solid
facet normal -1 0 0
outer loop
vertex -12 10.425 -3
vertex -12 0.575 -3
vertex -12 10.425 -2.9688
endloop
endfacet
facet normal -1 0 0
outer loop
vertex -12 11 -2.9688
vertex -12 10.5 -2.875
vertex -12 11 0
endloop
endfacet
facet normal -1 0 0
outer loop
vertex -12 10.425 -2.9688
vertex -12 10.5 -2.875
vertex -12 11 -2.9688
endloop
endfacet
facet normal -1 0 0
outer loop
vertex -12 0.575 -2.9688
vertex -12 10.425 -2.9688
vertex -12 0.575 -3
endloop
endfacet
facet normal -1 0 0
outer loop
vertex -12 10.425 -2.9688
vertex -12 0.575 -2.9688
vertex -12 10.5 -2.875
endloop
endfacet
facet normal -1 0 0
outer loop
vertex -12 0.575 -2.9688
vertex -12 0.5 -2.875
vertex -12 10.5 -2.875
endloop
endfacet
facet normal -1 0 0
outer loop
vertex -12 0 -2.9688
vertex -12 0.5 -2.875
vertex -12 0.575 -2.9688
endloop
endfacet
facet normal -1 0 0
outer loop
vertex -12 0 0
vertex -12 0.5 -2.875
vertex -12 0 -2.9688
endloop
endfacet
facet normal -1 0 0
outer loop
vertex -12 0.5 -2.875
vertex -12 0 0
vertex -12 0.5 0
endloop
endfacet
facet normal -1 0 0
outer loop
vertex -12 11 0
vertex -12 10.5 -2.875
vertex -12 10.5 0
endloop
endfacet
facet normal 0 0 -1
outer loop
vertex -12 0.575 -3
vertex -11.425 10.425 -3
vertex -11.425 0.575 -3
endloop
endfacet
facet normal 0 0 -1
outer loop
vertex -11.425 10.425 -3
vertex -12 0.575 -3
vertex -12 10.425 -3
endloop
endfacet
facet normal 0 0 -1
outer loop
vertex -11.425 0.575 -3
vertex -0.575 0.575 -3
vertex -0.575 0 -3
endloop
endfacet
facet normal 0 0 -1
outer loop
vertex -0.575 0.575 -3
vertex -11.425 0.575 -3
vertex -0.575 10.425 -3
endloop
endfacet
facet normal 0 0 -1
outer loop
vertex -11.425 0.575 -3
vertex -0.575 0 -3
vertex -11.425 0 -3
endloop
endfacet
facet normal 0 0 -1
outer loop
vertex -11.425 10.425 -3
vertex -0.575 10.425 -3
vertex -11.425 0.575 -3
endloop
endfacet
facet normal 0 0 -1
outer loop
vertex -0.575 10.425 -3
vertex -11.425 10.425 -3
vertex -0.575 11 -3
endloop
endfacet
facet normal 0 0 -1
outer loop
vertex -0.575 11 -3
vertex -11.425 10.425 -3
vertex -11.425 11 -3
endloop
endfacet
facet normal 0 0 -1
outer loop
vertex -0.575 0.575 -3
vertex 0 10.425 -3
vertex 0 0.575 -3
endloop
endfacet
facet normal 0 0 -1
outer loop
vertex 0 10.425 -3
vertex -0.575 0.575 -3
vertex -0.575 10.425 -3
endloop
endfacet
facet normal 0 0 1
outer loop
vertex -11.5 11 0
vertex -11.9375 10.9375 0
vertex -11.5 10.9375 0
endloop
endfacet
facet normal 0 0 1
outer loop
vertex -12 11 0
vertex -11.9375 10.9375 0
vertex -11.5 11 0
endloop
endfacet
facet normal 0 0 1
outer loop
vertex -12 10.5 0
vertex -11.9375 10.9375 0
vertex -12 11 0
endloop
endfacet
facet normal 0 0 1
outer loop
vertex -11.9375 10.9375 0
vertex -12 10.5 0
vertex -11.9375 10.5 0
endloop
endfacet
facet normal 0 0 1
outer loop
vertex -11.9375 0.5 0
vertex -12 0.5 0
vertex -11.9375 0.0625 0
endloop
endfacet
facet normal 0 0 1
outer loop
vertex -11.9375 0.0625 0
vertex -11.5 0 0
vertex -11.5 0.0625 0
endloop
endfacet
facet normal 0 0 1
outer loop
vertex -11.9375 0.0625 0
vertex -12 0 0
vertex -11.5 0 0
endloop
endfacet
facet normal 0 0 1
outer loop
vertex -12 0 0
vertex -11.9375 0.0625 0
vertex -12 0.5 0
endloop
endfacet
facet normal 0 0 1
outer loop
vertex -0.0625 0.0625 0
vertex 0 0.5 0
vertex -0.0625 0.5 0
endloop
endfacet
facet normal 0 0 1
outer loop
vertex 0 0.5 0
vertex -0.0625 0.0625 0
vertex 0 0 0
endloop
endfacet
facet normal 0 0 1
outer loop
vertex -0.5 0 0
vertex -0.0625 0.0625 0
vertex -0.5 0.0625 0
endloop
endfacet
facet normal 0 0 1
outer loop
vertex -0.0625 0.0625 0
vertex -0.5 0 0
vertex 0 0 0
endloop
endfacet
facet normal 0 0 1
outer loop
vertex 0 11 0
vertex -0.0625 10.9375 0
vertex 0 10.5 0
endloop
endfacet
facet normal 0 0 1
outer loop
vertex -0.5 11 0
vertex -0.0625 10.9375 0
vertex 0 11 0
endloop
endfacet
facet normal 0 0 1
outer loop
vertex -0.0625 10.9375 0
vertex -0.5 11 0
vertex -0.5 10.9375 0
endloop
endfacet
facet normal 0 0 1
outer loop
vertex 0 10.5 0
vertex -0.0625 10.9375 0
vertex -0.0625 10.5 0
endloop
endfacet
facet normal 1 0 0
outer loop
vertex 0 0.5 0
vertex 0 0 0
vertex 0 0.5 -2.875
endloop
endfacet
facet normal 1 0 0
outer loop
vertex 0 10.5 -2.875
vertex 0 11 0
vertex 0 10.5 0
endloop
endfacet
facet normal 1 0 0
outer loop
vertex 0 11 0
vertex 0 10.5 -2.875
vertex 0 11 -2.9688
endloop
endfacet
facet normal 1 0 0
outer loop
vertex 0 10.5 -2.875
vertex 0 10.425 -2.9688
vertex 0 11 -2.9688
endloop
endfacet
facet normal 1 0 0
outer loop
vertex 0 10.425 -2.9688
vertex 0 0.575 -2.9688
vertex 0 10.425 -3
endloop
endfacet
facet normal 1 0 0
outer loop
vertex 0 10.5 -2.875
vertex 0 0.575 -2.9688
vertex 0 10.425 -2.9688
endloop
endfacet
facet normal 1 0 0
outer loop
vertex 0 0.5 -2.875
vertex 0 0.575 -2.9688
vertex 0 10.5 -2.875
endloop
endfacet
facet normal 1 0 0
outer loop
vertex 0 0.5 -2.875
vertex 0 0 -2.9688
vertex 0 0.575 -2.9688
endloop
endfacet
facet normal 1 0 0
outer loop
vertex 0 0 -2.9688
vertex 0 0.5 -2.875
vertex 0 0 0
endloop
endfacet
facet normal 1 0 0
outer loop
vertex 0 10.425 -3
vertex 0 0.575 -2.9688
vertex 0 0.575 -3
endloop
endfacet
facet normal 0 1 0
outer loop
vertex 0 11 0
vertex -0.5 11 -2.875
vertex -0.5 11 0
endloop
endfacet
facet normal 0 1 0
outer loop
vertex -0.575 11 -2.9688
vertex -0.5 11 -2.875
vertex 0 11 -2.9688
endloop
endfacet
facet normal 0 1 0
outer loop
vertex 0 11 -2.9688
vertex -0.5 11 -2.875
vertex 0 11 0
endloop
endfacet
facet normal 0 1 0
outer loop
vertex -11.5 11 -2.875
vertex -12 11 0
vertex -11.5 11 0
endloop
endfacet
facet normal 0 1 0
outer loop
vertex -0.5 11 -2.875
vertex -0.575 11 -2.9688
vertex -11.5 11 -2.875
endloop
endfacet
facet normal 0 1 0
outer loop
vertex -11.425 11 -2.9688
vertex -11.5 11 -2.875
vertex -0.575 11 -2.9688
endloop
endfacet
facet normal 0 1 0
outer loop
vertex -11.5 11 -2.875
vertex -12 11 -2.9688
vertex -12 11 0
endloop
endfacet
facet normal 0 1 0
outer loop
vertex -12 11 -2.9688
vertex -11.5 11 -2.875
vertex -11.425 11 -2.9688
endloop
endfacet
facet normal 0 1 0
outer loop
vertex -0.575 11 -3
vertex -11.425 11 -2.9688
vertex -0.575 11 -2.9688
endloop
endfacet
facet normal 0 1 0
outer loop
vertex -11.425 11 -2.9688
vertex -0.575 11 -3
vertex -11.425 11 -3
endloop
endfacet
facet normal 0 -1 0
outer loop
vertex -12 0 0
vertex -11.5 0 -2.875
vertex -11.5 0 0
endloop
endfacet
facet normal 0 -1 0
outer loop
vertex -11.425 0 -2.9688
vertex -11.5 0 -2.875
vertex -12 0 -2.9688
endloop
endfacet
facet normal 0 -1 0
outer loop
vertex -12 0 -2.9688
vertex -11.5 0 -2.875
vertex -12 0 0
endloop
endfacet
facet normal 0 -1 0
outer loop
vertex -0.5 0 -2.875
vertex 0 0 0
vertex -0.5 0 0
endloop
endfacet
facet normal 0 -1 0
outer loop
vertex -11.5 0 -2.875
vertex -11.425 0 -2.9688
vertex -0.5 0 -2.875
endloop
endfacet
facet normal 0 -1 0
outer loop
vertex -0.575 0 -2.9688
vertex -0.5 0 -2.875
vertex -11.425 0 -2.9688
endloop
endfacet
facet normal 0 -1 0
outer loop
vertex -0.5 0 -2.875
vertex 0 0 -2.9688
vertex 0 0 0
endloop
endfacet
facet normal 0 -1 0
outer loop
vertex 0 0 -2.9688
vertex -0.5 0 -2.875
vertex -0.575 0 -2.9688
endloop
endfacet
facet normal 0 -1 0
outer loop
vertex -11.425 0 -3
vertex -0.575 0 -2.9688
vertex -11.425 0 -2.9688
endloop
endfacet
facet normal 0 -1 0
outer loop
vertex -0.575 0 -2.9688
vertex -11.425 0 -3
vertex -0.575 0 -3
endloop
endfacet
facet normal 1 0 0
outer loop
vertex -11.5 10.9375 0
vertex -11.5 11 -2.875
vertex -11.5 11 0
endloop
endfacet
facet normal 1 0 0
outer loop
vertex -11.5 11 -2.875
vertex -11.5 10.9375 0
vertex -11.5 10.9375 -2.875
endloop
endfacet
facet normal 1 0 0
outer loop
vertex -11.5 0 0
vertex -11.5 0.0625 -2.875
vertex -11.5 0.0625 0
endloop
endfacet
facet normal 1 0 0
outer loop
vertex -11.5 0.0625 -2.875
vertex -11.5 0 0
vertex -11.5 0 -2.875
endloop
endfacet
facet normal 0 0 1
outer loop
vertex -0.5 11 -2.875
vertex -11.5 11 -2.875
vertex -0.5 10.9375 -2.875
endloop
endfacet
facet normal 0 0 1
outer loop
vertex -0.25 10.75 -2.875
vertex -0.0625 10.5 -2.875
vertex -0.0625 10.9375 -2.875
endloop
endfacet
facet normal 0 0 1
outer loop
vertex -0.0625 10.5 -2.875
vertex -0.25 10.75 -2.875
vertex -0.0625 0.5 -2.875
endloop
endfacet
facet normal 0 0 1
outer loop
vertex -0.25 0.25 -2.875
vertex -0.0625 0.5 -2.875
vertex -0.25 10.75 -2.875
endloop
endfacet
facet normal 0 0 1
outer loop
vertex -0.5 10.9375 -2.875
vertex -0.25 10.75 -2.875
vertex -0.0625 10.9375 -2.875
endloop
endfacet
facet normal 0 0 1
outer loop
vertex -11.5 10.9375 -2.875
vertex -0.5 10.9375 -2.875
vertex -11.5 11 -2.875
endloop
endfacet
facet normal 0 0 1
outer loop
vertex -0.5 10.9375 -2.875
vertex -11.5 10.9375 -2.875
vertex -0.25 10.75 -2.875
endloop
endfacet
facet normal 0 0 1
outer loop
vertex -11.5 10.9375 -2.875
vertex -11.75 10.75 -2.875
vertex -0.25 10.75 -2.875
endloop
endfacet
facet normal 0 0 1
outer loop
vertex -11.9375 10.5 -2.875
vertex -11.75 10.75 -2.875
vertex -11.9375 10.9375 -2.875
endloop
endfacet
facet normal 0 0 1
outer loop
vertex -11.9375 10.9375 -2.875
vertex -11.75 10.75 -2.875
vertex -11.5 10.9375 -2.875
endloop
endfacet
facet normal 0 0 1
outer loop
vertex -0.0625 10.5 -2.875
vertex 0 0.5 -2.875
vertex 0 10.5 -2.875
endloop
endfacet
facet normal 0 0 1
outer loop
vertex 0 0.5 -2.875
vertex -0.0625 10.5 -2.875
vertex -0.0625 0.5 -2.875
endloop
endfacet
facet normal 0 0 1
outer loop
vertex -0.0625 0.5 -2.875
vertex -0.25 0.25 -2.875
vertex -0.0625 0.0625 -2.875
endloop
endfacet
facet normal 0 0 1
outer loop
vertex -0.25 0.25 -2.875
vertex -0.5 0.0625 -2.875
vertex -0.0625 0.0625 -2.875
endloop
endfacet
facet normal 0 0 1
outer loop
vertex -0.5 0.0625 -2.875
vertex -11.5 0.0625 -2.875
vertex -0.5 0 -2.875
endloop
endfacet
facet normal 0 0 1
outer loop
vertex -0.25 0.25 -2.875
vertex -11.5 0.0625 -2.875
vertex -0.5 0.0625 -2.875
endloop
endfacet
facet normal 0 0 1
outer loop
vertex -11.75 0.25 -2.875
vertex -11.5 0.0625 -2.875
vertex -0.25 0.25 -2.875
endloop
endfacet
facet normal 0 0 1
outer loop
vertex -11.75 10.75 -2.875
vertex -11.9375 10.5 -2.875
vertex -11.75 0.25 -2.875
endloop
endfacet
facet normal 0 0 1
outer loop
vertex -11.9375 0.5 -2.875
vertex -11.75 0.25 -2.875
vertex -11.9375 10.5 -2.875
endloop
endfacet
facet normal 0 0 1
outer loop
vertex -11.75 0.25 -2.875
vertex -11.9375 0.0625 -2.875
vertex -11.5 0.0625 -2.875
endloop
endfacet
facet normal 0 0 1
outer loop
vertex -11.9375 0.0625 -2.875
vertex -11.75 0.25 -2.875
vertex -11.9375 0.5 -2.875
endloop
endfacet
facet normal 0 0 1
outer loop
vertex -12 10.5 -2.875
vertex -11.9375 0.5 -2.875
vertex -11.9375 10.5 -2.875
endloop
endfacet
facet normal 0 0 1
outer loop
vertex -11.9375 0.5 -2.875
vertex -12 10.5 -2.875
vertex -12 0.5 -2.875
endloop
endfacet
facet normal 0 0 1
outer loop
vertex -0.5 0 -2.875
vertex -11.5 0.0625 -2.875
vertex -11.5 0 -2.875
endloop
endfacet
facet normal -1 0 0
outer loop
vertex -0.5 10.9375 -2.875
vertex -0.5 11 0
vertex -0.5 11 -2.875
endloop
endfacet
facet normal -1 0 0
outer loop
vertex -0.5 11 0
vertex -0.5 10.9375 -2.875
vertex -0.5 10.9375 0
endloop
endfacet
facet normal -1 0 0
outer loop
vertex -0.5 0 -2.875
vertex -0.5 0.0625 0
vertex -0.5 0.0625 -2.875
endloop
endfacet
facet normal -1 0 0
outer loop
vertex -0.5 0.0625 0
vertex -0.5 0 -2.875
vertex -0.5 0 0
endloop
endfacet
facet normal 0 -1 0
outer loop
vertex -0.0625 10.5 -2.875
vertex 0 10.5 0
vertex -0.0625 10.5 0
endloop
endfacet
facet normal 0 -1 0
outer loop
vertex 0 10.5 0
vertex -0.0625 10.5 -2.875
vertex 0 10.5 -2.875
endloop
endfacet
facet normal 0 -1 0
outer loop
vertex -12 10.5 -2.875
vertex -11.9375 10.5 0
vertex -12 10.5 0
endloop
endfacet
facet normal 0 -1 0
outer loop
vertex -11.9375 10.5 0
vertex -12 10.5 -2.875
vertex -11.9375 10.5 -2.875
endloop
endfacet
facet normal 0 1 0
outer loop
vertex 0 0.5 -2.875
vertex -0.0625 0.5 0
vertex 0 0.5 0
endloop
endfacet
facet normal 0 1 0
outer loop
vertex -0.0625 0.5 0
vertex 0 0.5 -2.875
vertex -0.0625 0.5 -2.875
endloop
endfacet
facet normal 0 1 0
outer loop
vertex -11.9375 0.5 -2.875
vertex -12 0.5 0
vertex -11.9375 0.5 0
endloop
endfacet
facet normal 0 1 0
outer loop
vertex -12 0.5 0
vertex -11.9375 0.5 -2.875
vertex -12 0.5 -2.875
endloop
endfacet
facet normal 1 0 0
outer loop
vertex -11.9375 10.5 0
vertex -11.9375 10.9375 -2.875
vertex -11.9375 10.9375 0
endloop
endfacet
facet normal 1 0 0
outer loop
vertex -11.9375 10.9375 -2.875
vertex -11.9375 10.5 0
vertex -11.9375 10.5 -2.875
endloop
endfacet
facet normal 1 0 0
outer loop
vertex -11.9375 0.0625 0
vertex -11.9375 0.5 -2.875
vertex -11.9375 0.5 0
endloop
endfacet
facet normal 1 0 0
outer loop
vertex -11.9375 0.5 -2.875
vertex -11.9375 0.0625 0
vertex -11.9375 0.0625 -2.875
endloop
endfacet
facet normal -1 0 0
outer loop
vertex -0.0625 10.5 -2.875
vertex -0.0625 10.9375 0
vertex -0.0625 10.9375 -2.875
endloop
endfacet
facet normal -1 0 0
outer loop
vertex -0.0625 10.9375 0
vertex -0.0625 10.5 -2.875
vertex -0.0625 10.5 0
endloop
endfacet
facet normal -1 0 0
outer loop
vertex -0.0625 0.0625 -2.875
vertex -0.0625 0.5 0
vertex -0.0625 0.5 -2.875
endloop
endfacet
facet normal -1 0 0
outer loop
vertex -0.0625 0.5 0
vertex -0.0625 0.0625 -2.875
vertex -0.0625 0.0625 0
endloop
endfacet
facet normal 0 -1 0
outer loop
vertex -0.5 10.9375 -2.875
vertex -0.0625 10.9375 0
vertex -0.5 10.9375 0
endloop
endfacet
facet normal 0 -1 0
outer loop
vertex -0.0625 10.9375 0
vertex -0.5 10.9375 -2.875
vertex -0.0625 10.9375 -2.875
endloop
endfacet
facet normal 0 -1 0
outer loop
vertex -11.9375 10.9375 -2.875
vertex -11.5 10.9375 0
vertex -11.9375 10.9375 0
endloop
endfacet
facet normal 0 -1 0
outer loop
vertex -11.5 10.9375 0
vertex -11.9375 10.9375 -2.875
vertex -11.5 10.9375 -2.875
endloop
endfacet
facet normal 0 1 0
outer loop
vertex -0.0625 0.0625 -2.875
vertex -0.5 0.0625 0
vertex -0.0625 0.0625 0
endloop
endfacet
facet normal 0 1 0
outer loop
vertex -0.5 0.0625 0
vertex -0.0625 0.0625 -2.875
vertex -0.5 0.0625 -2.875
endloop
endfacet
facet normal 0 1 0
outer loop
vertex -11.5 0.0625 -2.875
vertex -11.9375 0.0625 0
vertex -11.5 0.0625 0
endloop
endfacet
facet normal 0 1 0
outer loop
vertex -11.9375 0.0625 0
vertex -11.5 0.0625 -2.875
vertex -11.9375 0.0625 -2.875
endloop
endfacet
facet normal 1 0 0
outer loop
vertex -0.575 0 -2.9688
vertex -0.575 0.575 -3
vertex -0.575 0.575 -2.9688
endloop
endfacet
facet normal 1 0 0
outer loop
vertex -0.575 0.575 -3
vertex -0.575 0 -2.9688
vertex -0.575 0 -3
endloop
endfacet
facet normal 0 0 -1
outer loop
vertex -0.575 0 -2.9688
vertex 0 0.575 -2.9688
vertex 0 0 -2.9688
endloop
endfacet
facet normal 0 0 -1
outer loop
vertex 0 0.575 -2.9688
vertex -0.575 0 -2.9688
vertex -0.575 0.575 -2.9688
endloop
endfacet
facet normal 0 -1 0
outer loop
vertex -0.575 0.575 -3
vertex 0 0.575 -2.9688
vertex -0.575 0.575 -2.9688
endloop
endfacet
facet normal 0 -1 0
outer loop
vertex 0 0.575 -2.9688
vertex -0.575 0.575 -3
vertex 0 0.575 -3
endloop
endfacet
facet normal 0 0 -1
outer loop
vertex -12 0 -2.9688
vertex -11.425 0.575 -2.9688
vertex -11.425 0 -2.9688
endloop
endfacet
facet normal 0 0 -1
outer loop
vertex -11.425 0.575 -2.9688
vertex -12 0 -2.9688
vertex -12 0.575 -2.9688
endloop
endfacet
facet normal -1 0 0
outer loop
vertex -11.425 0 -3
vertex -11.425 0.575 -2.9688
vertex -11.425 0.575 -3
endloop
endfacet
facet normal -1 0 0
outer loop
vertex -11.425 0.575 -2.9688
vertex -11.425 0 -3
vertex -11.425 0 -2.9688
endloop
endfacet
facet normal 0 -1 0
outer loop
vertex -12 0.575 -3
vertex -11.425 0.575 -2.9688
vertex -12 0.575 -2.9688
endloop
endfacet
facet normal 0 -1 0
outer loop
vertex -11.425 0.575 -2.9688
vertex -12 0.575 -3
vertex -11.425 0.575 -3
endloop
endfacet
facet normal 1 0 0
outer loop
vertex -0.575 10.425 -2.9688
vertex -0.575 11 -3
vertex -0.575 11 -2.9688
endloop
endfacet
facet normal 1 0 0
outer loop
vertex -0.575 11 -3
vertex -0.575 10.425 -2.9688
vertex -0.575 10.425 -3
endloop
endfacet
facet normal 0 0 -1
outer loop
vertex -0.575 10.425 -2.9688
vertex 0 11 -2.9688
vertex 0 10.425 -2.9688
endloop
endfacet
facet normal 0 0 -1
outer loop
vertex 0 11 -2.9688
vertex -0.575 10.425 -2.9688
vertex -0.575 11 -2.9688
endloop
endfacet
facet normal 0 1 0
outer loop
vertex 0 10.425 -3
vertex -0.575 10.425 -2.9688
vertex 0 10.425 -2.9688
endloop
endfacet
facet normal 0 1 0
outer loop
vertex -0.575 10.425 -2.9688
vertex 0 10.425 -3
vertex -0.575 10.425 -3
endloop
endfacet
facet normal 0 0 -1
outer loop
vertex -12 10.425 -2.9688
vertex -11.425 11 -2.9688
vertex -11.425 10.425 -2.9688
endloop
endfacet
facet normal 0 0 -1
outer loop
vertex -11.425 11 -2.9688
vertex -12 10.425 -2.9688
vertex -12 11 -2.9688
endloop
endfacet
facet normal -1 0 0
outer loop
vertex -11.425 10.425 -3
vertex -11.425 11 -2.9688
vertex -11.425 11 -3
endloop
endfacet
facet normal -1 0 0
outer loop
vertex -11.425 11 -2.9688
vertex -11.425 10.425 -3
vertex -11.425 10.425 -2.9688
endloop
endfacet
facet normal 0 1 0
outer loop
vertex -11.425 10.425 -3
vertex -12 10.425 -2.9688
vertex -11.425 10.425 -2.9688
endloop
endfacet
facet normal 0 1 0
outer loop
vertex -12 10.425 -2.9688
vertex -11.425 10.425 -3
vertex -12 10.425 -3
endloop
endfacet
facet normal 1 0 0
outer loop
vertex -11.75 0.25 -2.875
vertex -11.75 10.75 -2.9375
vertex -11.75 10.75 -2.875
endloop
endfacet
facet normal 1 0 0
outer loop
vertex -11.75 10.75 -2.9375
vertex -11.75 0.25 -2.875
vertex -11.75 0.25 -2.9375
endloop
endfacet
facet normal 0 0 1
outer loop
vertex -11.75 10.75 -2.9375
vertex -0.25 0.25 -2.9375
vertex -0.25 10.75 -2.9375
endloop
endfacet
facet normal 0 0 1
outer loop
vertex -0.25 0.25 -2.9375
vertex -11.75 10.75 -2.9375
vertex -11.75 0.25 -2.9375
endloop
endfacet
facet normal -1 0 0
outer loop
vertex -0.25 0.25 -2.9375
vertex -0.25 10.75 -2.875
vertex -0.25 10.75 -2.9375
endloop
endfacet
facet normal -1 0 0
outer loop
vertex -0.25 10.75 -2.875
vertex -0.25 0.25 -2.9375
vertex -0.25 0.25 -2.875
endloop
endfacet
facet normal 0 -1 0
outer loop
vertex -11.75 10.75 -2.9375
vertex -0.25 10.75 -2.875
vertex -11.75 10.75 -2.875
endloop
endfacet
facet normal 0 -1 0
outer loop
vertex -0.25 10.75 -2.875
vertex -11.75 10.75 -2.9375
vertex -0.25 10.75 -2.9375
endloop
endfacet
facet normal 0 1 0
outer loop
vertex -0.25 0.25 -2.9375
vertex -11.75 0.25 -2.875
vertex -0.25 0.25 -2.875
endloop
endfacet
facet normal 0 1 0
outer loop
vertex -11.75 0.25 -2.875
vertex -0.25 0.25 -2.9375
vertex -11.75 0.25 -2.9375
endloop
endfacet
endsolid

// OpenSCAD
// x, z, y

units_per_inch=1;

sixteenth_inch = units_per_inch / 16.0;
eighth_inch = units_per_inch / 8.0;
quarter_inch = units_per_inch / 4.0;
half_inch = units_per_inch / 2.0;
inch = units_per_inch / 1.0;

//full size version
width=12*inch; // units (2 per inch)
height=3*inch;
depth=11*inch;

//small version (reduced width, depth, height, preserved leg dimensions and thicknesses)
//width=6*inch;
//height=1.5*inch;
//depth=5.5*inch;

shelf_perimeter_thickness = eighth_inch;
shelf_center_thickness = sixteenth_inch;

leg_thickness = sixteenth_inch;
leg_width_depth = half_inch;

corner_slop=0.15 * units_per_inch;
corner_notch_wd=(2*leg_width_depth) + corner_slop;
corner_notch_h=shelf_perimeter_thickness-sixteenth_inch; // center=true below makes this half-height

perimeter_width=quarter_inch;

rotate([0,180,0])
difference() { 
// main solid
cube([width,depth,height]);

// carve around legs
translate([leg_width_depth,0,0]) cube([width-(2*leg_width_depth),depth,height-shelf_perimeter_thickness]);
translate([0,leg_width_depth,0]) cube([width,depth-(2*leg_width_depth),height-shelf_perimeter_thickness]);

// notch inside of legs
translate([leg_thickness,leg_thickness,0]) cube([width-(2*leg_thickness),depth-(2*leg_thickness),height-shelf_perimeter_thickness]);

// corners for stacking
translate([0,0,height]) cube(size=[corner_notch_wd,corner_notch_wd,corner_notch_h],center=true);
translate([width,0,height]) cube(size=[corner_notch_wd,corner_notch_wd,corner_notch_h],center=true);
translate([0,depth,height]) cube(size=[corner_notch_wd,corner_notch_wd,corner_notch_h],center=true);
translate([width,depth,height]) cube(size=[corner_notch_wd,corner_notch_wd,corner_notch_h],center=true);

translate([perimeter_width,perimeter_width,0]) cube([width-(2*perimeter_width),depth-(2*perimeter_width),height-shelf_center_thickness]);
// vents?
}
